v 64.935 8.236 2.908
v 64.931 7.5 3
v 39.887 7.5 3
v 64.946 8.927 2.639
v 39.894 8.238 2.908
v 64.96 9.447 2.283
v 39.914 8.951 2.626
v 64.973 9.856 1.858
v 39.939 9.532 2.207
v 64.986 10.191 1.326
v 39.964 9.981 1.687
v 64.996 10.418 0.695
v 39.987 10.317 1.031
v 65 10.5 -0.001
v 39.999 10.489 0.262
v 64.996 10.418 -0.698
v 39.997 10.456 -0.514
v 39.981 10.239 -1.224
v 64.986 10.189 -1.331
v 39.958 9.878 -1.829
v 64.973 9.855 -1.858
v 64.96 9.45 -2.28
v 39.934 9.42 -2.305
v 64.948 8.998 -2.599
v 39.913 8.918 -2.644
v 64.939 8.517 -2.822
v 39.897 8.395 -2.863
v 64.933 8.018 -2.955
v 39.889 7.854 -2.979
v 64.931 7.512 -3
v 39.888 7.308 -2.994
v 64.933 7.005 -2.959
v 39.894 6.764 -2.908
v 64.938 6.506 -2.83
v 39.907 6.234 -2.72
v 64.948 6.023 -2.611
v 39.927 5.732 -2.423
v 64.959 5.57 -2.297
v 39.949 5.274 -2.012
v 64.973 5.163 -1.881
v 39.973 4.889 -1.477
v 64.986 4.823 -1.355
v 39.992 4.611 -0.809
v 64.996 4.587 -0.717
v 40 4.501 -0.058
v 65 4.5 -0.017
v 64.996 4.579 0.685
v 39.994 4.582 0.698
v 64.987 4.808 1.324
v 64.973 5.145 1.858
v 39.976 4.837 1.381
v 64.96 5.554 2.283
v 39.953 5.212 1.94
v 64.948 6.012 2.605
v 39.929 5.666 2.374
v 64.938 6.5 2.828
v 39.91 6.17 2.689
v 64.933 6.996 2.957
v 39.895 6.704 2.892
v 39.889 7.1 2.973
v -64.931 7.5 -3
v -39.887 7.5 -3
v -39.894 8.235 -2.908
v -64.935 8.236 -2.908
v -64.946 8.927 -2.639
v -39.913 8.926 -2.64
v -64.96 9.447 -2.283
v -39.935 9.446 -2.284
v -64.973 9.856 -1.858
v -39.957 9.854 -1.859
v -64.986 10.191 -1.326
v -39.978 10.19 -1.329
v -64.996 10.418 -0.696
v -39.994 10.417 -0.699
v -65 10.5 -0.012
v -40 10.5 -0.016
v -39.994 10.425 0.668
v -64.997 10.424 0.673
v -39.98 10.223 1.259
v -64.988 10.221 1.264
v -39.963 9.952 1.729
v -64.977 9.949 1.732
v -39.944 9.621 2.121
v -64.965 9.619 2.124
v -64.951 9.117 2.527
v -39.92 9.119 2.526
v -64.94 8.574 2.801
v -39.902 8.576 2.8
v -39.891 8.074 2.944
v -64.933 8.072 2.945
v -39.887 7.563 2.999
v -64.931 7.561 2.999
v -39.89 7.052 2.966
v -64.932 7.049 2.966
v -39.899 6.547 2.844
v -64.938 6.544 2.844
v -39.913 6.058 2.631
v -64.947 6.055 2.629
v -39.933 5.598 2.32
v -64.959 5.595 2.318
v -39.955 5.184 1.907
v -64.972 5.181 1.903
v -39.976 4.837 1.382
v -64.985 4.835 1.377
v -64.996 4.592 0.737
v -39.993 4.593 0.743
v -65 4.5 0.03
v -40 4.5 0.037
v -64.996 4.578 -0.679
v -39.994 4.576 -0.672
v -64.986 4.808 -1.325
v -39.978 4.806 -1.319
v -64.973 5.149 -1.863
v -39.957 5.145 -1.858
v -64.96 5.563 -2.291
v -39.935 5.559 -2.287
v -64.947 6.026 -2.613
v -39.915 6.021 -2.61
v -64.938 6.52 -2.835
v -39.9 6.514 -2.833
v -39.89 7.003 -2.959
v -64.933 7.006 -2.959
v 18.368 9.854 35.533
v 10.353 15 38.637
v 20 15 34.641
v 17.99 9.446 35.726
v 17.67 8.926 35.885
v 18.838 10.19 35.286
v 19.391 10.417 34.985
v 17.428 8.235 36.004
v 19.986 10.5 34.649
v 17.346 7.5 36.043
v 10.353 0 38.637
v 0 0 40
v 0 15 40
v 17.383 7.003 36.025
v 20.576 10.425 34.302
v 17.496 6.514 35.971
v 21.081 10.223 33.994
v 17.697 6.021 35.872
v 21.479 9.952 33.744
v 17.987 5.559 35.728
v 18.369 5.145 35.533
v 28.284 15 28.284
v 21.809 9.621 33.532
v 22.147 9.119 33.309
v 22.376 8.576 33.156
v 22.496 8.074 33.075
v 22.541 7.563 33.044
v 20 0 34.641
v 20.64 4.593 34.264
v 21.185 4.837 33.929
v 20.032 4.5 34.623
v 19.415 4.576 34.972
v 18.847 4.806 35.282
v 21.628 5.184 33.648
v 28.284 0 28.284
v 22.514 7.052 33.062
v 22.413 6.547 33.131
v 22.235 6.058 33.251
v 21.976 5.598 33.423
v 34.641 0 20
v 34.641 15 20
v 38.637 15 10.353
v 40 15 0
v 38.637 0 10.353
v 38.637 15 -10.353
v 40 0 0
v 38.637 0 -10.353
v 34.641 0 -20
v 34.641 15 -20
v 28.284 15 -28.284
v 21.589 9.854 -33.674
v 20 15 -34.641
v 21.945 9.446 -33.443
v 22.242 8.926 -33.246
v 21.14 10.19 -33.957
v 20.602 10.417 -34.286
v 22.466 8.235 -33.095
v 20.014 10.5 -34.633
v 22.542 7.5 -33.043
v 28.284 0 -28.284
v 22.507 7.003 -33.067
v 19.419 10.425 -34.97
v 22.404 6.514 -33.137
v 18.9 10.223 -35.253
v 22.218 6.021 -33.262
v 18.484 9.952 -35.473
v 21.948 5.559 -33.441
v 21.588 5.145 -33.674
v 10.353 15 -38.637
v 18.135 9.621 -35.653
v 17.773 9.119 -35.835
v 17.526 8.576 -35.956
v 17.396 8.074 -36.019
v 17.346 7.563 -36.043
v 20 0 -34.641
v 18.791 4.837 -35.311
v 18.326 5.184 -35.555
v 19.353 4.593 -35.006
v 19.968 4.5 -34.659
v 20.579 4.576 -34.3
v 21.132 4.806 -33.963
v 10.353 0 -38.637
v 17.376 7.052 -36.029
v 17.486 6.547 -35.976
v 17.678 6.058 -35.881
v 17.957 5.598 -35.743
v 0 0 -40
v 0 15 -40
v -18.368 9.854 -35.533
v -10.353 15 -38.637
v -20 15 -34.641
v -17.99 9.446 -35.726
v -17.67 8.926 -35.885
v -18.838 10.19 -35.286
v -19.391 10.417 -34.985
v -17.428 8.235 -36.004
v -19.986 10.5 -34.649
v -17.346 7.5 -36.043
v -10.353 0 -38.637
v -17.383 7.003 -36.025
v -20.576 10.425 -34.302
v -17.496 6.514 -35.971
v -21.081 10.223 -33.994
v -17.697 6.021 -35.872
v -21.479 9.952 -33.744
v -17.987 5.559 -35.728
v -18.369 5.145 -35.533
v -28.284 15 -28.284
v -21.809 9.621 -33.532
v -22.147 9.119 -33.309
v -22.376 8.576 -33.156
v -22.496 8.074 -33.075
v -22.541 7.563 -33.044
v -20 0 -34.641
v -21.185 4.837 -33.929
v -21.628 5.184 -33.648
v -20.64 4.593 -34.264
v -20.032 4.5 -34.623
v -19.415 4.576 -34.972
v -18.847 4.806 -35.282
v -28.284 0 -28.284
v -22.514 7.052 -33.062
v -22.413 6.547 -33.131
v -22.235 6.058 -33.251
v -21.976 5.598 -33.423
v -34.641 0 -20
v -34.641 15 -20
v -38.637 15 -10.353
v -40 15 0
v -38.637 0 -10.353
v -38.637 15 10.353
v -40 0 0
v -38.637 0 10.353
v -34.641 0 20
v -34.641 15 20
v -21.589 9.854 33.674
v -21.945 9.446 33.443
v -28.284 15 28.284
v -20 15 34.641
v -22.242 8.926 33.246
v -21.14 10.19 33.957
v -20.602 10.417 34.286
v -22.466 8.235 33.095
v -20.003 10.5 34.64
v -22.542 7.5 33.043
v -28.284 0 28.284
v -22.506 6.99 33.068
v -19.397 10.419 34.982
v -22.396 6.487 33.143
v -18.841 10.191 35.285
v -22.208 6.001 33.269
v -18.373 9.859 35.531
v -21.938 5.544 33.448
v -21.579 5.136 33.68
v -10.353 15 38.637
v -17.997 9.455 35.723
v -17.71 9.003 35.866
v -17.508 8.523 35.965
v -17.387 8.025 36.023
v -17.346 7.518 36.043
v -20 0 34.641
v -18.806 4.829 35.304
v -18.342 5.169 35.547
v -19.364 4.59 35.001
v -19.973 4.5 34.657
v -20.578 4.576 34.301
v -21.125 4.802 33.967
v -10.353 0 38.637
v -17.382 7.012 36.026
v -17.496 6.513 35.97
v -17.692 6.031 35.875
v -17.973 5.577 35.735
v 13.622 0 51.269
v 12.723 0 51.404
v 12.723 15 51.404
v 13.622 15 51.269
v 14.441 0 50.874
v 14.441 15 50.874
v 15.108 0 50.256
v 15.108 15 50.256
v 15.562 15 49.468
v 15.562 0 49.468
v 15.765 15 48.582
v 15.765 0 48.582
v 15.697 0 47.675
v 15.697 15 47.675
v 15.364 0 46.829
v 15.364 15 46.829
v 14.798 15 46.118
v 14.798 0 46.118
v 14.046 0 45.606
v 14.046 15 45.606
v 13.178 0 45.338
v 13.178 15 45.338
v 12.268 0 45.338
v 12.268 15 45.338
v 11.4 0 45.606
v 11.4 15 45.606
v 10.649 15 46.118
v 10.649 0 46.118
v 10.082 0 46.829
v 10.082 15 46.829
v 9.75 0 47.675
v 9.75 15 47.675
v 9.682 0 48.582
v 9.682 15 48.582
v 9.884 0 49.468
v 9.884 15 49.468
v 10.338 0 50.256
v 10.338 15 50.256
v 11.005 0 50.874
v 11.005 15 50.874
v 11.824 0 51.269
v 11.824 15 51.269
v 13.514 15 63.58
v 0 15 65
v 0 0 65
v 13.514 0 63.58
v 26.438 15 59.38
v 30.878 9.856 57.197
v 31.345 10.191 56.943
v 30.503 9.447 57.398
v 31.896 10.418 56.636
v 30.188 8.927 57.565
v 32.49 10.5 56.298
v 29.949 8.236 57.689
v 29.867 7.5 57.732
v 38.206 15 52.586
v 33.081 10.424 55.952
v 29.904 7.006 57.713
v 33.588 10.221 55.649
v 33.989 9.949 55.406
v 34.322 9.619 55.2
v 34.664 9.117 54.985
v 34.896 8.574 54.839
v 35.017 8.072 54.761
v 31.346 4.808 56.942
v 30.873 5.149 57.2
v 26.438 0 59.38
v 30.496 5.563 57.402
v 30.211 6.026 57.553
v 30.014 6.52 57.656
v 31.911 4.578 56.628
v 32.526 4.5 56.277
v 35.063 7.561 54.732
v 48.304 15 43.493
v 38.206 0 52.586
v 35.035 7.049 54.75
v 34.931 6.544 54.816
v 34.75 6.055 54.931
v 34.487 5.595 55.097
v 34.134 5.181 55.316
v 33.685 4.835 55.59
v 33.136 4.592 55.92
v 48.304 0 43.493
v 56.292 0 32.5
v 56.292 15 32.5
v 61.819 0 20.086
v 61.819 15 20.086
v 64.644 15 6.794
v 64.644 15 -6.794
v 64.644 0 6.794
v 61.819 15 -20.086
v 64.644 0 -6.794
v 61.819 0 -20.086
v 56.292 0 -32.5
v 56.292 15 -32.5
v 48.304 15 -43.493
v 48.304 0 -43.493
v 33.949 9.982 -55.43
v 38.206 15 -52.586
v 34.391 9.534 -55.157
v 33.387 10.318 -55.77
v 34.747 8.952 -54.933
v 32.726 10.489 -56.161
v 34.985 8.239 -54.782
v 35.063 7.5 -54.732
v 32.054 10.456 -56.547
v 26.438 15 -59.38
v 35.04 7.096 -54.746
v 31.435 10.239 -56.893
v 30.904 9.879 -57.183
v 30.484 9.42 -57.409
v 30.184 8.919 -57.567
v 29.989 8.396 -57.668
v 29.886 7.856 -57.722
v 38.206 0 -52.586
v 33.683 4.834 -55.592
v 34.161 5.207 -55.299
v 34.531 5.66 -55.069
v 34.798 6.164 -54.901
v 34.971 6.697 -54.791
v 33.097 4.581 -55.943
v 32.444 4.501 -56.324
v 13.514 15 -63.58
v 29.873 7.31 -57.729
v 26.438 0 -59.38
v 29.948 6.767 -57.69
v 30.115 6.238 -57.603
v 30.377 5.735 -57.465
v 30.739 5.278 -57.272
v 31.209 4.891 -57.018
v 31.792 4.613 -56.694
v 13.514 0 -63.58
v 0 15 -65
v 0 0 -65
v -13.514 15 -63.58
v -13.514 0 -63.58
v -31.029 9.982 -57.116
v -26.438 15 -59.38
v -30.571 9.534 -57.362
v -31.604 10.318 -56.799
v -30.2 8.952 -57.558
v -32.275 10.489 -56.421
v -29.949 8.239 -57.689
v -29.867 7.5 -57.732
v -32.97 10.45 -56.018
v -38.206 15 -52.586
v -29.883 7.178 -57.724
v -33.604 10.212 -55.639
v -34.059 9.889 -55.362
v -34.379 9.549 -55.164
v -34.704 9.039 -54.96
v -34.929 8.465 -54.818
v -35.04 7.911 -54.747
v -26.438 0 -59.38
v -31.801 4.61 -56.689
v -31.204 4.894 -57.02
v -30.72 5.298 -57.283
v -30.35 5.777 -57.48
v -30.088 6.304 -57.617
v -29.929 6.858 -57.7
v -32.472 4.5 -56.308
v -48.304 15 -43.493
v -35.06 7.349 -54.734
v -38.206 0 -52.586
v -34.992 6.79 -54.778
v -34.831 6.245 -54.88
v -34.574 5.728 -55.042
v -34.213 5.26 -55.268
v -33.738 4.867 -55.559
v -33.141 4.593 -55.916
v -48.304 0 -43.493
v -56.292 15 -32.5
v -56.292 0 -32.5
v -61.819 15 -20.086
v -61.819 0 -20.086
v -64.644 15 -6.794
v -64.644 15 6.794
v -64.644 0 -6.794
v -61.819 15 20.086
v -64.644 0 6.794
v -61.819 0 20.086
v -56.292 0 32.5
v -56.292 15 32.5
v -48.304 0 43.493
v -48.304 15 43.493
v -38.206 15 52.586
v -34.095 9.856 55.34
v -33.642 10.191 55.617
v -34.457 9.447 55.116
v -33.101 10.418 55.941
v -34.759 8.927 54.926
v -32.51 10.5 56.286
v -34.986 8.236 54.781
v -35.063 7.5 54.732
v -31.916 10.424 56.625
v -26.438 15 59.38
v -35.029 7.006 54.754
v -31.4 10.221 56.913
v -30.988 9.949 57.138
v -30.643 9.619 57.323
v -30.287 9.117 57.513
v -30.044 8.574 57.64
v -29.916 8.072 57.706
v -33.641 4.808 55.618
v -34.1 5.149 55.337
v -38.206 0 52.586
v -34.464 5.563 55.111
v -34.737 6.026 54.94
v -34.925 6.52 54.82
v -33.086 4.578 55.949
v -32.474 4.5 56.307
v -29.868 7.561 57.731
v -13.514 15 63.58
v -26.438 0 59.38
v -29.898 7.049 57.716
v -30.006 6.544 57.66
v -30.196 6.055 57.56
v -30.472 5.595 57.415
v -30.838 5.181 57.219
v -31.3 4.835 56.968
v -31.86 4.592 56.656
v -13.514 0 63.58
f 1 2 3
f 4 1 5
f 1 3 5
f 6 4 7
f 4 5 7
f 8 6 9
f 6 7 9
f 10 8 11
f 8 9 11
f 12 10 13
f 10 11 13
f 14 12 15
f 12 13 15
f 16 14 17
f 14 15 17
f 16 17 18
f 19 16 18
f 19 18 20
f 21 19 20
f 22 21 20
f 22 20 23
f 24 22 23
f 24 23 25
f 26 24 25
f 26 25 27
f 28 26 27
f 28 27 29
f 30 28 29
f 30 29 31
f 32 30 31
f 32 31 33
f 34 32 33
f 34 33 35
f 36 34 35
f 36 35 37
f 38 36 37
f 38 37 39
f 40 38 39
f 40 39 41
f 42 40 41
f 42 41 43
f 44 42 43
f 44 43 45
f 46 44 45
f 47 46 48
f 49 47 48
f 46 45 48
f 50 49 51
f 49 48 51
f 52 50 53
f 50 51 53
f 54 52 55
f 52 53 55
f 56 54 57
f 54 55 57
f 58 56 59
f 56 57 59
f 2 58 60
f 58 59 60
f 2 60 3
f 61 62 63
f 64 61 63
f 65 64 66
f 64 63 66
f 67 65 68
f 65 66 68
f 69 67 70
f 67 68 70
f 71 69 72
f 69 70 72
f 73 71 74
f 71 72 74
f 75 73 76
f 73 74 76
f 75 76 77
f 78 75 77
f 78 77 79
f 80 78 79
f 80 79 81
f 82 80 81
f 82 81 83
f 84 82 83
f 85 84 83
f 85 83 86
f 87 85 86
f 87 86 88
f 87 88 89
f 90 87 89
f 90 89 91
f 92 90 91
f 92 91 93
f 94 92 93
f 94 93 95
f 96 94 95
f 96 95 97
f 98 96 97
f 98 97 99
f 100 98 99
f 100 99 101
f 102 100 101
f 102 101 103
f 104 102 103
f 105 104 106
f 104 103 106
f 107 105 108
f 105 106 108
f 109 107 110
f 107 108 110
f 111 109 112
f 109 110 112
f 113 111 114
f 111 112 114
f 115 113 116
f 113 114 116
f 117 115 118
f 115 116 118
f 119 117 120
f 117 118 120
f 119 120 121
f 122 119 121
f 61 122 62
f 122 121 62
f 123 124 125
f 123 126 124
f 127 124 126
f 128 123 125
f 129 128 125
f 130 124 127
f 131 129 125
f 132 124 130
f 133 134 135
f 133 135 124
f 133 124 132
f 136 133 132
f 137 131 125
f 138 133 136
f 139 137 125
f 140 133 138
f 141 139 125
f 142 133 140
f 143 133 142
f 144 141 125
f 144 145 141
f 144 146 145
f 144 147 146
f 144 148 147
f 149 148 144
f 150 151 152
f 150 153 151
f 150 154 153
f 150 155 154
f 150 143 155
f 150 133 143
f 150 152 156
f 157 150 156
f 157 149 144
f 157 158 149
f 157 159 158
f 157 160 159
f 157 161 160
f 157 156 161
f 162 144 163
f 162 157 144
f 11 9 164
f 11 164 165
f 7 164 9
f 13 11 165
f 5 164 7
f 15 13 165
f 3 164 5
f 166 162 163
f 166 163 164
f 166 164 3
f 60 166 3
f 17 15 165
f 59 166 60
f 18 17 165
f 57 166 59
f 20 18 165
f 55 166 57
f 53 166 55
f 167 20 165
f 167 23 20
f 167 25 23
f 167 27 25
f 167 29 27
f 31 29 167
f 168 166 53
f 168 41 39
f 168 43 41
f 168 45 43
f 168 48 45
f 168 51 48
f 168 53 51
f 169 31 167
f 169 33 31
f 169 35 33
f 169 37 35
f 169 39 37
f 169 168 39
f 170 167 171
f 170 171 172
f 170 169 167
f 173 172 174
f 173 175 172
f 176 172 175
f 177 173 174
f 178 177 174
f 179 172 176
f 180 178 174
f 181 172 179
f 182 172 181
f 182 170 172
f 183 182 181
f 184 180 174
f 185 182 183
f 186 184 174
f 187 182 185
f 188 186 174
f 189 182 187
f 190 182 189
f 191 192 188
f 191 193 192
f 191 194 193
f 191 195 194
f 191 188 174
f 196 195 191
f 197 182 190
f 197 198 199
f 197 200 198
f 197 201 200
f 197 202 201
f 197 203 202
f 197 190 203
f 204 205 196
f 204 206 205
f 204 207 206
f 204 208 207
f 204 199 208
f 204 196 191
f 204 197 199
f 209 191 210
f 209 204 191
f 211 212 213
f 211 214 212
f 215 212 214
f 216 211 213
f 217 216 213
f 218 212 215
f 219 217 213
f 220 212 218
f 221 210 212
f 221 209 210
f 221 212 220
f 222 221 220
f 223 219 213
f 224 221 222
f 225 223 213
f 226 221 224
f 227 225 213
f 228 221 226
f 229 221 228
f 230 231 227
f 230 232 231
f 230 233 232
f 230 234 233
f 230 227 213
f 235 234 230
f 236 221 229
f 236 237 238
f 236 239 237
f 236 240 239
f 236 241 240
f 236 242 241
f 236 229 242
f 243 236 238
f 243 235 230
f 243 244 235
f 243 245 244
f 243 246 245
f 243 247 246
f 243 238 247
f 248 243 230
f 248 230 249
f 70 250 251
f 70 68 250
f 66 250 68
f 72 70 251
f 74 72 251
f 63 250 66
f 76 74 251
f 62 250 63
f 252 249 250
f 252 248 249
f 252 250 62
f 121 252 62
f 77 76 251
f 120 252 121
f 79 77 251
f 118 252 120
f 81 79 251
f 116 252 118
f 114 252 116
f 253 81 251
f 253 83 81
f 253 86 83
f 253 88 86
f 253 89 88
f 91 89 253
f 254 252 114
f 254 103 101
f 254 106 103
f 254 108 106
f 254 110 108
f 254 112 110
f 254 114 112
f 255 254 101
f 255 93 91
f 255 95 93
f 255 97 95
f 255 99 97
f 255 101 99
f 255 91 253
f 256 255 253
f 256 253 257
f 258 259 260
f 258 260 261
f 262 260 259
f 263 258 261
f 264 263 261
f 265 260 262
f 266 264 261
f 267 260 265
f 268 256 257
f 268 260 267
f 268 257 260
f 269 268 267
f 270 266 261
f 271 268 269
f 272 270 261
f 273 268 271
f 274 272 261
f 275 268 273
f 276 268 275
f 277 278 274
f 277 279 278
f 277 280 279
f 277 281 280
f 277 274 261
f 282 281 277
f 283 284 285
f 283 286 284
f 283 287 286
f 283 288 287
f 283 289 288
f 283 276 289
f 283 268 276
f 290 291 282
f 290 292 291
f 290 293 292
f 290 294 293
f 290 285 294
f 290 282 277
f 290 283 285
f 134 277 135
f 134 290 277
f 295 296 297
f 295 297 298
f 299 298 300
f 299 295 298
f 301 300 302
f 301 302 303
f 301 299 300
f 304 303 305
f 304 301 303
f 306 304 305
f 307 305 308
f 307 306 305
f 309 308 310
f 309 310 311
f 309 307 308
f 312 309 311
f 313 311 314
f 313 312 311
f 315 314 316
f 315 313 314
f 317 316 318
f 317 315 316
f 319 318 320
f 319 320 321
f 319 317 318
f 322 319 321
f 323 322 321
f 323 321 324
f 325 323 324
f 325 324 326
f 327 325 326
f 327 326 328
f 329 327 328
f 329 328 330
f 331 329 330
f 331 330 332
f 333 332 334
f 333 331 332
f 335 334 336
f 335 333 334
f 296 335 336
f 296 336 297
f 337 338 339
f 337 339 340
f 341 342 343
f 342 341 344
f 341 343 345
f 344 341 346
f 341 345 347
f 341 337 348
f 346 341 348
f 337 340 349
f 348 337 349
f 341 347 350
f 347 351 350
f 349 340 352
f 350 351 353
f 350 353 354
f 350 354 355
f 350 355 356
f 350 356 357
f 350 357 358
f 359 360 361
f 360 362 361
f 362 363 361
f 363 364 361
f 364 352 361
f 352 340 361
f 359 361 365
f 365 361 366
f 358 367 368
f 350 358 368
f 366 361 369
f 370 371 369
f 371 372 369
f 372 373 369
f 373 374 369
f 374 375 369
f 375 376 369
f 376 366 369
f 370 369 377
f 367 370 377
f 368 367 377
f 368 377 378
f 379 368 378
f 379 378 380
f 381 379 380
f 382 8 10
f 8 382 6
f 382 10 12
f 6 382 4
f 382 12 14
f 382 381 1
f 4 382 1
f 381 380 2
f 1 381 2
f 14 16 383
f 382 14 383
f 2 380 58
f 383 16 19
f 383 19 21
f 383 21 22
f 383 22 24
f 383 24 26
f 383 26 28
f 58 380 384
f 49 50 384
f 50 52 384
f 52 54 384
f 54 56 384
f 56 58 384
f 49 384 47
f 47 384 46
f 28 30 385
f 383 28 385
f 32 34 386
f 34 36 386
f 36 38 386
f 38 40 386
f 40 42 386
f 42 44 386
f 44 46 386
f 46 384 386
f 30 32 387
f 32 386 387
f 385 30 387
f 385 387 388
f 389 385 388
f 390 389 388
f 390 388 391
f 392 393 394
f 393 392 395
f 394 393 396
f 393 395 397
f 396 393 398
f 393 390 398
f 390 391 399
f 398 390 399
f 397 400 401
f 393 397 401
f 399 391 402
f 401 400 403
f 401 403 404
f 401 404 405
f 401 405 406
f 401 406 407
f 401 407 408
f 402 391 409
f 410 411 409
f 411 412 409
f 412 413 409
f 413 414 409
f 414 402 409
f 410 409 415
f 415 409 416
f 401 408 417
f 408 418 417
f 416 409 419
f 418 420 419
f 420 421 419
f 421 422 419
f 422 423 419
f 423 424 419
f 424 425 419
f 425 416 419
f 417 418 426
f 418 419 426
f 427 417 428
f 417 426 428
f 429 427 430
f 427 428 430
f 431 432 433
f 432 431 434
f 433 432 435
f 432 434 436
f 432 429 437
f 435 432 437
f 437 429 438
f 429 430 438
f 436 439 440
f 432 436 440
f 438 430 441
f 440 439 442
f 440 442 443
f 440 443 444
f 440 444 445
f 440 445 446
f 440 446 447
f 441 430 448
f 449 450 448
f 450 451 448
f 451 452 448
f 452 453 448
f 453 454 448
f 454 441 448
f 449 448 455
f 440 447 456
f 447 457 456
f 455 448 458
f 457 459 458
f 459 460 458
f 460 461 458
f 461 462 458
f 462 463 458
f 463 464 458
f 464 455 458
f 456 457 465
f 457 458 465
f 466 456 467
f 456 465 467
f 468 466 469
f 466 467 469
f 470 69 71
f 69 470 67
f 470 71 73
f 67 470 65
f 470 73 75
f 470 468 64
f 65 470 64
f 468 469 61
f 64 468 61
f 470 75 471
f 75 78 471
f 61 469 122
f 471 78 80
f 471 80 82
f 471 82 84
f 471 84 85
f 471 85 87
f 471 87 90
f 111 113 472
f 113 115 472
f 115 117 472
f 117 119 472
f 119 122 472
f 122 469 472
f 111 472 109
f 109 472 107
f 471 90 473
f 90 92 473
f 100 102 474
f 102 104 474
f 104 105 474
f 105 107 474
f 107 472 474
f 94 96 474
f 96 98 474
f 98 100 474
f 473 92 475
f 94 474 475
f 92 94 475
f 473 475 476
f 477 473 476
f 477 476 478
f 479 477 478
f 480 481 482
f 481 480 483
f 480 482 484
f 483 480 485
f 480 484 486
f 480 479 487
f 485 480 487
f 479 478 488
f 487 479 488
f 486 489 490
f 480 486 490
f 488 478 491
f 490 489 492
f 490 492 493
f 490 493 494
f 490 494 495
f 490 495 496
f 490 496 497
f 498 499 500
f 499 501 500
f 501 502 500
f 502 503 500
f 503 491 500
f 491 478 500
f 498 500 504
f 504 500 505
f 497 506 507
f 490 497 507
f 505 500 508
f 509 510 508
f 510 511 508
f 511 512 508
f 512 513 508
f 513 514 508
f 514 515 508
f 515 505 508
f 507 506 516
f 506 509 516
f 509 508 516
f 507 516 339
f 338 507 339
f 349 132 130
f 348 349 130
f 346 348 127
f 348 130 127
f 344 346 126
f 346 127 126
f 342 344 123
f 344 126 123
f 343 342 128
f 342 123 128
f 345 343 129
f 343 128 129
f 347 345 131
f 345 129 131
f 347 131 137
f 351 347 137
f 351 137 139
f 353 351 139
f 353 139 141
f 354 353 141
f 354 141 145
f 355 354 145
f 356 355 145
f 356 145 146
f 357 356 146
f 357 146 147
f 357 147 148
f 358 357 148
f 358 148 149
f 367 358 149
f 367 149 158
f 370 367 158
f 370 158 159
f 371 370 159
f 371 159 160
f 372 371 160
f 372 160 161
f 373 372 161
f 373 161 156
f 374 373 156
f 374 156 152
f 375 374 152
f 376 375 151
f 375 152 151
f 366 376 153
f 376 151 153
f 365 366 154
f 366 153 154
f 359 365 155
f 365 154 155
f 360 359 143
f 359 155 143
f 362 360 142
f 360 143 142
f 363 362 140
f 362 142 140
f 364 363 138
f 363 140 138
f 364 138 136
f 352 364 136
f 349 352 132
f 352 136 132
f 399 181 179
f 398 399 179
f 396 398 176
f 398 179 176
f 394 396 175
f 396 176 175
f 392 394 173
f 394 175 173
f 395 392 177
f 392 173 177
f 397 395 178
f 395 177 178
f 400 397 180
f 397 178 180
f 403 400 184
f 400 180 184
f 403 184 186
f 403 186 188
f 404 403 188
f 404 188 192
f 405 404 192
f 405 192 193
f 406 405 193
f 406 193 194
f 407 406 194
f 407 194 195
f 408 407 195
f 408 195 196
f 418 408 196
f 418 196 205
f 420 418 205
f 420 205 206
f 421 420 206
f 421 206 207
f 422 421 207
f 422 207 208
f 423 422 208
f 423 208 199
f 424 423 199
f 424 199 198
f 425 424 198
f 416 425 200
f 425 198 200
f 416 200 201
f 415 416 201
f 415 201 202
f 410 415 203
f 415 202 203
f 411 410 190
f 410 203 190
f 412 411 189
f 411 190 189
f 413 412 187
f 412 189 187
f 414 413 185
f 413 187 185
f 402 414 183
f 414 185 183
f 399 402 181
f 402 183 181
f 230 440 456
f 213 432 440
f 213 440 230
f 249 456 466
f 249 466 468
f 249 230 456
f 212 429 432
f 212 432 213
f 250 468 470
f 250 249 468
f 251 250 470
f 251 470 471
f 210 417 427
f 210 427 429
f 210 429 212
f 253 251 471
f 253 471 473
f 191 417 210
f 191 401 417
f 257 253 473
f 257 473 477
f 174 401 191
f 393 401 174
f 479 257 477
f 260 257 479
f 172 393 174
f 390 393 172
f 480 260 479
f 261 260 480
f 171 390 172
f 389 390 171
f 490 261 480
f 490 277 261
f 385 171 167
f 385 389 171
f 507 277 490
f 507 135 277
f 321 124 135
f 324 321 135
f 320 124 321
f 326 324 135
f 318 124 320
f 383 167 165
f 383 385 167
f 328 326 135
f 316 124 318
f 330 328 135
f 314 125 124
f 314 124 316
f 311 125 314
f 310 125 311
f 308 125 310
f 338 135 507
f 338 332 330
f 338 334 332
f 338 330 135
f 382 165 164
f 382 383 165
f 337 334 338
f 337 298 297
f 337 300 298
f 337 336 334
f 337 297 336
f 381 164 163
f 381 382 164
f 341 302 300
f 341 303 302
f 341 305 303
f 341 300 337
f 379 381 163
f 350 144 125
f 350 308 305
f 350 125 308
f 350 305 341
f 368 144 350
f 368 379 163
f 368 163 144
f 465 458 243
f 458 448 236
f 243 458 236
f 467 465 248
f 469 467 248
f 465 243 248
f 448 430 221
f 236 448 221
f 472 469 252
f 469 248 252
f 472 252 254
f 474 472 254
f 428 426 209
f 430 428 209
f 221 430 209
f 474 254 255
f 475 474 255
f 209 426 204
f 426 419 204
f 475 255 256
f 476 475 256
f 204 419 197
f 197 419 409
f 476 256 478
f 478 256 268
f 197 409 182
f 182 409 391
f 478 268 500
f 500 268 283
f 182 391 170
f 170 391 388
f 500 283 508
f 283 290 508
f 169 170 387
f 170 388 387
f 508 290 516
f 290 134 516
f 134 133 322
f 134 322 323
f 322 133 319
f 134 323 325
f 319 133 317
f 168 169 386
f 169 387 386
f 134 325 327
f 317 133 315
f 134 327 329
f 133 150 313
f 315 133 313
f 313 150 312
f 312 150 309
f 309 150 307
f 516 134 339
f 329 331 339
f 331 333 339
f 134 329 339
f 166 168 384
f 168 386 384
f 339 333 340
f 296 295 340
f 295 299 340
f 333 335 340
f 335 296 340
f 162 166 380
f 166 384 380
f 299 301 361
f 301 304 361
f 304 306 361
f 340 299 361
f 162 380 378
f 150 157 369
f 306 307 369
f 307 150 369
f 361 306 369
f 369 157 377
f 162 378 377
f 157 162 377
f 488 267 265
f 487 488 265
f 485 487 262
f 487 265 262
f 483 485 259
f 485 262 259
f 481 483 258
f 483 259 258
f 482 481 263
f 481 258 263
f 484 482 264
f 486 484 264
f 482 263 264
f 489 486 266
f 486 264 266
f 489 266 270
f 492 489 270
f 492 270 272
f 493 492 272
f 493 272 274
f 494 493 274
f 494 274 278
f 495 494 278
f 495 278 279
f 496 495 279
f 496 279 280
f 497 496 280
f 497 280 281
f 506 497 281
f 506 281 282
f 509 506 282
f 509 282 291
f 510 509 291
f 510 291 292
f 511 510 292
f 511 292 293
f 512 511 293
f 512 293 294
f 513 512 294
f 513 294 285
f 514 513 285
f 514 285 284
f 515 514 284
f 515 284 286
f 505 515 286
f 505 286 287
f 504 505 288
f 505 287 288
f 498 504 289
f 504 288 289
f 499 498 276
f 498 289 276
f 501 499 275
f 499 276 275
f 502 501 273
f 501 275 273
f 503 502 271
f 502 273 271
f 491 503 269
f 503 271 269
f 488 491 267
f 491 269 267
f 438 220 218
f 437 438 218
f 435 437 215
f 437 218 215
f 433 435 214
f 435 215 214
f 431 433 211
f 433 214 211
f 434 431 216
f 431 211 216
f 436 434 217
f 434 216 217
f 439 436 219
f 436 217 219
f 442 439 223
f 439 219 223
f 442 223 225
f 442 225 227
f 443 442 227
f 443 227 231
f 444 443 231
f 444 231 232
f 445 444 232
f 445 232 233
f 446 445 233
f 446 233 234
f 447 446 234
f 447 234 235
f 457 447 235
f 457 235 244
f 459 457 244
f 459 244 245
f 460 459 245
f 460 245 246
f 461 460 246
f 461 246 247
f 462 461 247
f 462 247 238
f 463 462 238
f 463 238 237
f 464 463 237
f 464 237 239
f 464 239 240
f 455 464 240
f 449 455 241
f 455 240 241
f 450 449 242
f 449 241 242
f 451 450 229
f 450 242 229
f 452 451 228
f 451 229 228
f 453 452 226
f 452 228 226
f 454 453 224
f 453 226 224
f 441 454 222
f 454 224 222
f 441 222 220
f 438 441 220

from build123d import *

# Parameters (mm, degrees)
SKETCH1_R           = 65
SKETCH1_R_2         = 40
SKETCH1_R_3         = 3.05
BOSS_EXTRUDE1_DEPTH = 15
SKETCH2_R           = 3
CUT_EXTRUDE1_DEPTH  = 94.139680051
CIRPATTERN1_COUNT   = 6


with BuildPart() as part:
    # Sketch1 → Boss-Extrude1 (new body)
    with BuildSketch(Plane(origin=(0, 0, 0), x_dir=(1, 0, 0), z_dir=(0, 1, 0))):
        with Locations(Location((0, 0, 0), (0, 0, 270))):
            Circle(SKETCH1_R)
        with Locations(Location((0, 0, 0), (0, 0, 270))):
            Circle(SKETCH1_R_2, mode=Mode.SUBTRACT)
        with Locations(Location((12.723046489, -48.354152749, 0), (0, 0, 270))):
            Circle(SKETCH1_R_3, mode=Mode.SUBTRACT)
    extrude(amount=BOSS_EXTRUDE1_DEPTH)

    # Sketch2 → Cut-Extrude1 (cut, through all)
    with BuildSketch(Plane(origin=(0, 0, 0), x_dir=(0, 0, -1), z_dir=(1, 0, 0))):
        with Locations((0, 7.5)):
            Circle(SKETCH2_R)
    cut_extrude1 = extrude(amount=-CUT_EXTRUDE1_DEPTH, mode=Mode.SUBTRACT)

    # CirPattern1: Cut-Extrude1 ×6 about axis
    cirpattern1_axis = Axis((0, 15, 0), (0, 1, 0))
    for i in range(1, CIRPATTERN1_COUNT):
        add(cut_extrude1.rotate(cirpattern1_axis, i * 360 / CIRPATTERN1_COUNT), mode=Mode.SUBTRACT)


solid = part.part
